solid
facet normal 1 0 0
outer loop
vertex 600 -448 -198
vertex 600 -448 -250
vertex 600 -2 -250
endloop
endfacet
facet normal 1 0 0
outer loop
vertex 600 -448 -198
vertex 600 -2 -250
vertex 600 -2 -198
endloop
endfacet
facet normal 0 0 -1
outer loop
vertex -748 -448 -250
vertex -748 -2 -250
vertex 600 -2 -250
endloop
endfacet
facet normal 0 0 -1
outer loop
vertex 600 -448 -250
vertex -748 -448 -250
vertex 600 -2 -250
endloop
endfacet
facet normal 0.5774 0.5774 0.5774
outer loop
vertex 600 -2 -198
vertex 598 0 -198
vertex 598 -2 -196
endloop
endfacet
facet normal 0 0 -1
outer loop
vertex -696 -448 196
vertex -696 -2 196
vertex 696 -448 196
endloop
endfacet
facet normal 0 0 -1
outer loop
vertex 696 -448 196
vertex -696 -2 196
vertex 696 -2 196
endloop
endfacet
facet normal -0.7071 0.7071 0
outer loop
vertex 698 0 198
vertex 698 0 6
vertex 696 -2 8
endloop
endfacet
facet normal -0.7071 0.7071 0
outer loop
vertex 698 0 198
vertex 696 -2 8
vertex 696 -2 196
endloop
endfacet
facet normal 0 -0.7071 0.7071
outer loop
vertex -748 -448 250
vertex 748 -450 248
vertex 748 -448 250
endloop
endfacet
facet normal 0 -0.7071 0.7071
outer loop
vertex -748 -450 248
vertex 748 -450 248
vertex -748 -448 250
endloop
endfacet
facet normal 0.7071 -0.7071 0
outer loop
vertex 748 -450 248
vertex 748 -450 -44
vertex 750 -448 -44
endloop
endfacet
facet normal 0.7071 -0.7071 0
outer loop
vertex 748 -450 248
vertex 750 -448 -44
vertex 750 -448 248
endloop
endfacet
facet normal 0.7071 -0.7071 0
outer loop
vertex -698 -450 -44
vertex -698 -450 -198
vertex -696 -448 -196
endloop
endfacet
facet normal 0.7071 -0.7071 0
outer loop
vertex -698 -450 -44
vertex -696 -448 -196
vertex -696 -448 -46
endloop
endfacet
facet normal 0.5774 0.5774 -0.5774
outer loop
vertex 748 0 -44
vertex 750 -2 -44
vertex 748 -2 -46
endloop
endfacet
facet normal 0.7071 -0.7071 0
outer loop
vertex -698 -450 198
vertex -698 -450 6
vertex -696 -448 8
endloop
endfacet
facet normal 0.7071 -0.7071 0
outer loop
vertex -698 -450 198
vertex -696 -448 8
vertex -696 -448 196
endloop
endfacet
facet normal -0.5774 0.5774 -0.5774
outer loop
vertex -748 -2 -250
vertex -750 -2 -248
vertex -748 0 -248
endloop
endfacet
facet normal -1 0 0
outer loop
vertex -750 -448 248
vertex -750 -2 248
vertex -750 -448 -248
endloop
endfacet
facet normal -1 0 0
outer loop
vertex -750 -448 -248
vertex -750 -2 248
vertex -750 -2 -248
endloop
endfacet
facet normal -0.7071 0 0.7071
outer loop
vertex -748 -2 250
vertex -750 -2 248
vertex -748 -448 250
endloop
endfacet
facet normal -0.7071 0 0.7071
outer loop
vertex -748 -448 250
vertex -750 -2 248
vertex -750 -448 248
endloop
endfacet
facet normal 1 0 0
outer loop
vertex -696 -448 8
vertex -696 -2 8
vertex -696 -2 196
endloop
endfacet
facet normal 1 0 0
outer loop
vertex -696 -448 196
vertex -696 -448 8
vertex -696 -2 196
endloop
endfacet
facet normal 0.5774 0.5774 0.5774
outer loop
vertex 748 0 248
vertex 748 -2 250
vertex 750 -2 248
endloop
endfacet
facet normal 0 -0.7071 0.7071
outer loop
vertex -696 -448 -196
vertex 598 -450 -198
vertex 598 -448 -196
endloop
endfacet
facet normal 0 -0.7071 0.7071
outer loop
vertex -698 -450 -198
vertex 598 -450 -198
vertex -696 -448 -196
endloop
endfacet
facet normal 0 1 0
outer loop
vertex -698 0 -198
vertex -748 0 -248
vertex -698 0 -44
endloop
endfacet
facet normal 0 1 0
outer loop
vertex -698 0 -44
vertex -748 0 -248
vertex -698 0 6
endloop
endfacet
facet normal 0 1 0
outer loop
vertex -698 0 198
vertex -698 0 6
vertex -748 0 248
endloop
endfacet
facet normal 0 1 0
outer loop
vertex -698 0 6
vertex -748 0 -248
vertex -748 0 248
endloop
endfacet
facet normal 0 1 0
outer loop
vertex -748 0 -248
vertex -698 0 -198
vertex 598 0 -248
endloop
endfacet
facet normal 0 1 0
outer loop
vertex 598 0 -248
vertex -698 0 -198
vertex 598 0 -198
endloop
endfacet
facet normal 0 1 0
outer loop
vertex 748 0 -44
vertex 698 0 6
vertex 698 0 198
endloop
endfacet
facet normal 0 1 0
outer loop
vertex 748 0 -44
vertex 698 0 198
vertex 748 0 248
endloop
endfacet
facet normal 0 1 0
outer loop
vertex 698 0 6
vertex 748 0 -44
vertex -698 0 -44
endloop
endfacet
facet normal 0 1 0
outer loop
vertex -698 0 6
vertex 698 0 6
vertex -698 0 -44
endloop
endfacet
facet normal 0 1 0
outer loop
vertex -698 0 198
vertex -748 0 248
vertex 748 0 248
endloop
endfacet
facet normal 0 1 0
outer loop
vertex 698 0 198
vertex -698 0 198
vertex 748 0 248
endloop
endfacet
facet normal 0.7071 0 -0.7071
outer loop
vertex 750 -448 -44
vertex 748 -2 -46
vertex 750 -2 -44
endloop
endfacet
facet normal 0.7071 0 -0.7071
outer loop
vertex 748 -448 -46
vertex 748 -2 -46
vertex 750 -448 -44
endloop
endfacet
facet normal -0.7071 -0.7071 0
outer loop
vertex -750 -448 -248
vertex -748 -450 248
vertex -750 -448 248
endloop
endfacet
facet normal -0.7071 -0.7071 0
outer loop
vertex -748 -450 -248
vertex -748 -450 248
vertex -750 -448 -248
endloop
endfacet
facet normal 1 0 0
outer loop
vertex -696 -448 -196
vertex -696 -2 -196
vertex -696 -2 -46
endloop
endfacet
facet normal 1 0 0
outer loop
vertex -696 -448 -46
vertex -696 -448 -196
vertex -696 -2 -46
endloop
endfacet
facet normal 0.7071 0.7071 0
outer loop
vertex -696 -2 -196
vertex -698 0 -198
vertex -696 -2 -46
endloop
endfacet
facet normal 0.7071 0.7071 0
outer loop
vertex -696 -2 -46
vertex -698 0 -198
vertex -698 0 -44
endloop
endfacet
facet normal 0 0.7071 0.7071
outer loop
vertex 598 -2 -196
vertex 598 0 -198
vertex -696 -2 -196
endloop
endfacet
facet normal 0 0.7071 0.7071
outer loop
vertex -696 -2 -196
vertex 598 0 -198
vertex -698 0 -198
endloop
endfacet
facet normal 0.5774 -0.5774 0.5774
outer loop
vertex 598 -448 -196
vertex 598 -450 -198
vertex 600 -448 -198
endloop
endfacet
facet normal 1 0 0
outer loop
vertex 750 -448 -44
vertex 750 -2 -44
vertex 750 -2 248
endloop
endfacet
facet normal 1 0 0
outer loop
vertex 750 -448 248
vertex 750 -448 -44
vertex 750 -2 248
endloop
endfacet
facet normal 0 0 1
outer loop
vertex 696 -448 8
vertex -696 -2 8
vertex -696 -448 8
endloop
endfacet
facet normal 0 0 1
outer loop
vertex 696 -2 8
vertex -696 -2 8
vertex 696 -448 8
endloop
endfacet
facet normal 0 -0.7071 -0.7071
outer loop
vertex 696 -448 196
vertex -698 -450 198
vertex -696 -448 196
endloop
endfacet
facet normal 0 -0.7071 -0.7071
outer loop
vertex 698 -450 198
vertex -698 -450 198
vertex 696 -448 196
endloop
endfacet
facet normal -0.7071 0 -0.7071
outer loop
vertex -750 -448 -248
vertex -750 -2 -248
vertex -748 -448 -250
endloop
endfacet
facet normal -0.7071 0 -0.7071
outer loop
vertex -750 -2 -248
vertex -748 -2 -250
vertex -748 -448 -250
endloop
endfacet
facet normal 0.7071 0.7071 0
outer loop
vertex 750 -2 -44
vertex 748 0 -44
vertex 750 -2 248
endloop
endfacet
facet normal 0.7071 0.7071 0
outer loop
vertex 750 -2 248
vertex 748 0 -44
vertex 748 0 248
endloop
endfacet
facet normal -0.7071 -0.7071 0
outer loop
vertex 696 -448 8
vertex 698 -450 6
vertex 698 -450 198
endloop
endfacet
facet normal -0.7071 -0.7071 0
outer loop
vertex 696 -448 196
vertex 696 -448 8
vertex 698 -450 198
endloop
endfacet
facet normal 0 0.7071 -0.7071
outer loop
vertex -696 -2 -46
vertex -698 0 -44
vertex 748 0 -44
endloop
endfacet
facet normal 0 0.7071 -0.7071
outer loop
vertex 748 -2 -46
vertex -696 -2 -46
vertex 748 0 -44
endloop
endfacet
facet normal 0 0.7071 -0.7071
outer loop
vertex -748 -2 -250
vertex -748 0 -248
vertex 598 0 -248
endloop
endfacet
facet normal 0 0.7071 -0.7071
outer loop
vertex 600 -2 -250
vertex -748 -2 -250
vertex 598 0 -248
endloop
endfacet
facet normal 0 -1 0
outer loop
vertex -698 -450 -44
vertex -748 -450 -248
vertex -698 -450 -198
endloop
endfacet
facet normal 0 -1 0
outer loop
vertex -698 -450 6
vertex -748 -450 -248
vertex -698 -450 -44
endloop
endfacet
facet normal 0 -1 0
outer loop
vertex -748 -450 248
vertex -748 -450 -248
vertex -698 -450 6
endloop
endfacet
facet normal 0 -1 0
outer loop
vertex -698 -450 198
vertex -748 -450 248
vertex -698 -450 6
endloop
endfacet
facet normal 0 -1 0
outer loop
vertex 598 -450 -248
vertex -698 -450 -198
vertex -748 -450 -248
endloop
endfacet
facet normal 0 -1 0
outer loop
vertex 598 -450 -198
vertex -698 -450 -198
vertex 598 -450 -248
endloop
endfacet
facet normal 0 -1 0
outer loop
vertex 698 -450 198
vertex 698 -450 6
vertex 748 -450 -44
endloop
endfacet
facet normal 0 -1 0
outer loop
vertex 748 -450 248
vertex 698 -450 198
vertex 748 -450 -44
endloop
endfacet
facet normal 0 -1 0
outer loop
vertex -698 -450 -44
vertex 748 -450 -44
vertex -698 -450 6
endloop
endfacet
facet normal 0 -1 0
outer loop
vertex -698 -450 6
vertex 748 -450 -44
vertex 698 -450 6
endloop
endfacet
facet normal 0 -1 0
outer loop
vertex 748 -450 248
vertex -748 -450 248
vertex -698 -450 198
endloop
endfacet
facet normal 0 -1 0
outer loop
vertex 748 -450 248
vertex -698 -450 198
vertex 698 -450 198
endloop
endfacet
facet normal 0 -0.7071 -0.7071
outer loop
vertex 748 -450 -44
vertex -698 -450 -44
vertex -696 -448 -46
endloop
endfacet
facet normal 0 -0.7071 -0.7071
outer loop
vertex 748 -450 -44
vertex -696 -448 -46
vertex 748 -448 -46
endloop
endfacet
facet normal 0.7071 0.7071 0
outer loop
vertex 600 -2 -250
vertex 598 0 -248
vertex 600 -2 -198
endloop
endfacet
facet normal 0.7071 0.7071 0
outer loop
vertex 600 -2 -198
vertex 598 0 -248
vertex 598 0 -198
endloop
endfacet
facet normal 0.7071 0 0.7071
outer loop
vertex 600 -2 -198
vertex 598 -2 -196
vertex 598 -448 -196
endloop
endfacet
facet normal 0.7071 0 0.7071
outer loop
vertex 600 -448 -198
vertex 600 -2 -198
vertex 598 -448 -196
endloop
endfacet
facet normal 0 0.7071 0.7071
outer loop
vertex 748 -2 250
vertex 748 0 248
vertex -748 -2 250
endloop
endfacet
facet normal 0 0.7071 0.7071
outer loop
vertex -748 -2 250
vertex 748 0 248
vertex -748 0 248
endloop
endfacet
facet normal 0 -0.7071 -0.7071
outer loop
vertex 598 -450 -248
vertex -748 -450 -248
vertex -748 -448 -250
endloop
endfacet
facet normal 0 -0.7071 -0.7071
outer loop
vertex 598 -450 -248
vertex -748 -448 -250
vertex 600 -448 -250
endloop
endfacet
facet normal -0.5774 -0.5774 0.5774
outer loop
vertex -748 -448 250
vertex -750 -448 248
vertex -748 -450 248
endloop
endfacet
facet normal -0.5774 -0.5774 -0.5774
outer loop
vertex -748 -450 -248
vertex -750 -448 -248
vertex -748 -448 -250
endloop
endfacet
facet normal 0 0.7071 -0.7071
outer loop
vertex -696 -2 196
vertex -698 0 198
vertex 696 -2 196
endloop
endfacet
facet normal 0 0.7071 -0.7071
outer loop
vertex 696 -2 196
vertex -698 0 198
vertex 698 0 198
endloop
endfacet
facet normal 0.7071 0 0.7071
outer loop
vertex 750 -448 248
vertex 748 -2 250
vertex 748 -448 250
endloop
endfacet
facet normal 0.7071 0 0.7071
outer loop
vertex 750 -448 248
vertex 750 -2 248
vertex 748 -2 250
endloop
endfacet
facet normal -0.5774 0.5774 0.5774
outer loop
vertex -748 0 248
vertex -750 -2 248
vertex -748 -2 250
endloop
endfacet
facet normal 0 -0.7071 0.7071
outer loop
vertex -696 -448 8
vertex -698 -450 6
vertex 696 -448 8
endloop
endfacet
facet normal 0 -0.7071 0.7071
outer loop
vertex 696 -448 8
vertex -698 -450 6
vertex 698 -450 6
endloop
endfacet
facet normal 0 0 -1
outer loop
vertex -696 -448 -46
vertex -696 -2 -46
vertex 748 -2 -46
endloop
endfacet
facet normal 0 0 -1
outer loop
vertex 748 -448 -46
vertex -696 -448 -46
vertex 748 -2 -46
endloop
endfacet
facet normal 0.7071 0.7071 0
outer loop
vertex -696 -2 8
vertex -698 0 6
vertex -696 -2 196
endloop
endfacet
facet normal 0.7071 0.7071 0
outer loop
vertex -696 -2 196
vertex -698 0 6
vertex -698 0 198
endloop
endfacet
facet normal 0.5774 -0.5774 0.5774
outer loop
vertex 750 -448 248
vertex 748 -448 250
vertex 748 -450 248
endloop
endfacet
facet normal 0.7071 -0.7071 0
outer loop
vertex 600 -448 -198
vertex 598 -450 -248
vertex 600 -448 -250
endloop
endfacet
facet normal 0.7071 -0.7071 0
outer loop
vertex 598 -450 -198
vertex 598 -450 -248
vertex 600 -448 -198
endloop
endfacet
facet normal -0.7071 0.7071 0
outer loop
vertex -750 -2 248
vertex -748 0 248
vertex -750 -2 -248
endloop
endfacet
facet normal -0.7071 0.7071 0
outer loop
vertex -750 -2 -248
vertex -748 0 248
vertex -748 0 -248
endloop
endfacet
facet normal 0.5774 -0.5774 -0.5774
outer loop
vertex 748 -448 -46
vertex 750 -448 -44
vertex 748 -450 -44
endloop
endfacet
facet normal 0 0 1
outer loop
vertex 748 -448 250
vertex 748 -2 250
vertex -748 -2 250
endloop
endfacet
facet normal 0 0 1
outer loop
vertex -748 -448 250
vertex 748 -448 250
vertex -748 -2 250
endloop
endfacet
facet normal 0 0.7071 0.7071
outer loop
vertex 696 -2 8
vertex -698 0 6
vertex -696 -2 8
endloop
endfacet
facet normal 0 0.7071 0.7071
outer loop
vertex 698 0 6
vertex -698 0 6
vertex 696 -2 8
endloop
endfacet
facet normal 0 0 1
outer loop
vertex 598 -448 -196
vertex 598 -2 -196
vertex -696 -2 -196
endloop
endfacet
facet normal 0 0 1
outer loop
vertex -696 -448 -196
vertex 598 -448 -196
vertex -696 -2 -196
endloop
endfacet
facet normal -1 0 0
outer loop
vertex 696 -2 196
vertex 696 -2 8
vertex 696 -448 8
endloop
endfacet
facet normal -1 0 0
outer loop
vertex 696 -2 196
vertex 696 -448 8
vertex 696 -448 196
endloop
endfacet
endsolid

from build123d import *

# Parameters (mm, degrees)
F0_W     = 1392
F0_H     = 188
F1_DEPTH = 450
F2_SIZE  = 2


# Not quite as in the source:
# - a feature names something its author has since deleted; it is built from what else it names


with BuildPart() as f1:
    # F0 (on Front) → F1 (new body)
    with BuildSketch(Plane.XZ):
        Polygon((750, 250), (-750, 250), (-750, -250), (600, -250), (600, -196), (-696, -196), (-696, -46), (750, -46), align=None)
        with Locations((0, 102)):
            Rectangle(F0_W, F0_H, mode=Mode.SUBTRACT)
    extrude(amount=F1_DEPTH)

    # F2
    f2_edges = [f1.edges().sort_by_distance(p)[0] for p in [
        (-750, -225, 250),
        (-750, -225, -250),
        (-750, 0, 0),
        (-750, -450, 0),
        (750, -225, 250),
        (0, 0, 250),
        (0, -450, 250),
        (750, -225, -46),
        (750, 0, 102),
        (750, -450, 102),
        (-75, -450, -250),
        (600, -450, -223),
        (-48, -450, -196),
        (-696, -450, -121),
        (27, -450, -46),
        (-696, -450, 102),
        (0, -450, 196),
        (696, -450, 102),
        (0, -450, 8),
        (-75, 0, -250),
        (600, 0, -223),
        (-48, 0, -196),
        (-696, 0, -121),
        (27, 0, -46),
        (-696, 0, 102),
        (0, 0, 196),
        (696, 0, 102),
        (0, 0, 8),
        (600, -225, -196),
    ]]
    chamfer(f2_edges, length=F2_SIZE)


solid = f1.part
